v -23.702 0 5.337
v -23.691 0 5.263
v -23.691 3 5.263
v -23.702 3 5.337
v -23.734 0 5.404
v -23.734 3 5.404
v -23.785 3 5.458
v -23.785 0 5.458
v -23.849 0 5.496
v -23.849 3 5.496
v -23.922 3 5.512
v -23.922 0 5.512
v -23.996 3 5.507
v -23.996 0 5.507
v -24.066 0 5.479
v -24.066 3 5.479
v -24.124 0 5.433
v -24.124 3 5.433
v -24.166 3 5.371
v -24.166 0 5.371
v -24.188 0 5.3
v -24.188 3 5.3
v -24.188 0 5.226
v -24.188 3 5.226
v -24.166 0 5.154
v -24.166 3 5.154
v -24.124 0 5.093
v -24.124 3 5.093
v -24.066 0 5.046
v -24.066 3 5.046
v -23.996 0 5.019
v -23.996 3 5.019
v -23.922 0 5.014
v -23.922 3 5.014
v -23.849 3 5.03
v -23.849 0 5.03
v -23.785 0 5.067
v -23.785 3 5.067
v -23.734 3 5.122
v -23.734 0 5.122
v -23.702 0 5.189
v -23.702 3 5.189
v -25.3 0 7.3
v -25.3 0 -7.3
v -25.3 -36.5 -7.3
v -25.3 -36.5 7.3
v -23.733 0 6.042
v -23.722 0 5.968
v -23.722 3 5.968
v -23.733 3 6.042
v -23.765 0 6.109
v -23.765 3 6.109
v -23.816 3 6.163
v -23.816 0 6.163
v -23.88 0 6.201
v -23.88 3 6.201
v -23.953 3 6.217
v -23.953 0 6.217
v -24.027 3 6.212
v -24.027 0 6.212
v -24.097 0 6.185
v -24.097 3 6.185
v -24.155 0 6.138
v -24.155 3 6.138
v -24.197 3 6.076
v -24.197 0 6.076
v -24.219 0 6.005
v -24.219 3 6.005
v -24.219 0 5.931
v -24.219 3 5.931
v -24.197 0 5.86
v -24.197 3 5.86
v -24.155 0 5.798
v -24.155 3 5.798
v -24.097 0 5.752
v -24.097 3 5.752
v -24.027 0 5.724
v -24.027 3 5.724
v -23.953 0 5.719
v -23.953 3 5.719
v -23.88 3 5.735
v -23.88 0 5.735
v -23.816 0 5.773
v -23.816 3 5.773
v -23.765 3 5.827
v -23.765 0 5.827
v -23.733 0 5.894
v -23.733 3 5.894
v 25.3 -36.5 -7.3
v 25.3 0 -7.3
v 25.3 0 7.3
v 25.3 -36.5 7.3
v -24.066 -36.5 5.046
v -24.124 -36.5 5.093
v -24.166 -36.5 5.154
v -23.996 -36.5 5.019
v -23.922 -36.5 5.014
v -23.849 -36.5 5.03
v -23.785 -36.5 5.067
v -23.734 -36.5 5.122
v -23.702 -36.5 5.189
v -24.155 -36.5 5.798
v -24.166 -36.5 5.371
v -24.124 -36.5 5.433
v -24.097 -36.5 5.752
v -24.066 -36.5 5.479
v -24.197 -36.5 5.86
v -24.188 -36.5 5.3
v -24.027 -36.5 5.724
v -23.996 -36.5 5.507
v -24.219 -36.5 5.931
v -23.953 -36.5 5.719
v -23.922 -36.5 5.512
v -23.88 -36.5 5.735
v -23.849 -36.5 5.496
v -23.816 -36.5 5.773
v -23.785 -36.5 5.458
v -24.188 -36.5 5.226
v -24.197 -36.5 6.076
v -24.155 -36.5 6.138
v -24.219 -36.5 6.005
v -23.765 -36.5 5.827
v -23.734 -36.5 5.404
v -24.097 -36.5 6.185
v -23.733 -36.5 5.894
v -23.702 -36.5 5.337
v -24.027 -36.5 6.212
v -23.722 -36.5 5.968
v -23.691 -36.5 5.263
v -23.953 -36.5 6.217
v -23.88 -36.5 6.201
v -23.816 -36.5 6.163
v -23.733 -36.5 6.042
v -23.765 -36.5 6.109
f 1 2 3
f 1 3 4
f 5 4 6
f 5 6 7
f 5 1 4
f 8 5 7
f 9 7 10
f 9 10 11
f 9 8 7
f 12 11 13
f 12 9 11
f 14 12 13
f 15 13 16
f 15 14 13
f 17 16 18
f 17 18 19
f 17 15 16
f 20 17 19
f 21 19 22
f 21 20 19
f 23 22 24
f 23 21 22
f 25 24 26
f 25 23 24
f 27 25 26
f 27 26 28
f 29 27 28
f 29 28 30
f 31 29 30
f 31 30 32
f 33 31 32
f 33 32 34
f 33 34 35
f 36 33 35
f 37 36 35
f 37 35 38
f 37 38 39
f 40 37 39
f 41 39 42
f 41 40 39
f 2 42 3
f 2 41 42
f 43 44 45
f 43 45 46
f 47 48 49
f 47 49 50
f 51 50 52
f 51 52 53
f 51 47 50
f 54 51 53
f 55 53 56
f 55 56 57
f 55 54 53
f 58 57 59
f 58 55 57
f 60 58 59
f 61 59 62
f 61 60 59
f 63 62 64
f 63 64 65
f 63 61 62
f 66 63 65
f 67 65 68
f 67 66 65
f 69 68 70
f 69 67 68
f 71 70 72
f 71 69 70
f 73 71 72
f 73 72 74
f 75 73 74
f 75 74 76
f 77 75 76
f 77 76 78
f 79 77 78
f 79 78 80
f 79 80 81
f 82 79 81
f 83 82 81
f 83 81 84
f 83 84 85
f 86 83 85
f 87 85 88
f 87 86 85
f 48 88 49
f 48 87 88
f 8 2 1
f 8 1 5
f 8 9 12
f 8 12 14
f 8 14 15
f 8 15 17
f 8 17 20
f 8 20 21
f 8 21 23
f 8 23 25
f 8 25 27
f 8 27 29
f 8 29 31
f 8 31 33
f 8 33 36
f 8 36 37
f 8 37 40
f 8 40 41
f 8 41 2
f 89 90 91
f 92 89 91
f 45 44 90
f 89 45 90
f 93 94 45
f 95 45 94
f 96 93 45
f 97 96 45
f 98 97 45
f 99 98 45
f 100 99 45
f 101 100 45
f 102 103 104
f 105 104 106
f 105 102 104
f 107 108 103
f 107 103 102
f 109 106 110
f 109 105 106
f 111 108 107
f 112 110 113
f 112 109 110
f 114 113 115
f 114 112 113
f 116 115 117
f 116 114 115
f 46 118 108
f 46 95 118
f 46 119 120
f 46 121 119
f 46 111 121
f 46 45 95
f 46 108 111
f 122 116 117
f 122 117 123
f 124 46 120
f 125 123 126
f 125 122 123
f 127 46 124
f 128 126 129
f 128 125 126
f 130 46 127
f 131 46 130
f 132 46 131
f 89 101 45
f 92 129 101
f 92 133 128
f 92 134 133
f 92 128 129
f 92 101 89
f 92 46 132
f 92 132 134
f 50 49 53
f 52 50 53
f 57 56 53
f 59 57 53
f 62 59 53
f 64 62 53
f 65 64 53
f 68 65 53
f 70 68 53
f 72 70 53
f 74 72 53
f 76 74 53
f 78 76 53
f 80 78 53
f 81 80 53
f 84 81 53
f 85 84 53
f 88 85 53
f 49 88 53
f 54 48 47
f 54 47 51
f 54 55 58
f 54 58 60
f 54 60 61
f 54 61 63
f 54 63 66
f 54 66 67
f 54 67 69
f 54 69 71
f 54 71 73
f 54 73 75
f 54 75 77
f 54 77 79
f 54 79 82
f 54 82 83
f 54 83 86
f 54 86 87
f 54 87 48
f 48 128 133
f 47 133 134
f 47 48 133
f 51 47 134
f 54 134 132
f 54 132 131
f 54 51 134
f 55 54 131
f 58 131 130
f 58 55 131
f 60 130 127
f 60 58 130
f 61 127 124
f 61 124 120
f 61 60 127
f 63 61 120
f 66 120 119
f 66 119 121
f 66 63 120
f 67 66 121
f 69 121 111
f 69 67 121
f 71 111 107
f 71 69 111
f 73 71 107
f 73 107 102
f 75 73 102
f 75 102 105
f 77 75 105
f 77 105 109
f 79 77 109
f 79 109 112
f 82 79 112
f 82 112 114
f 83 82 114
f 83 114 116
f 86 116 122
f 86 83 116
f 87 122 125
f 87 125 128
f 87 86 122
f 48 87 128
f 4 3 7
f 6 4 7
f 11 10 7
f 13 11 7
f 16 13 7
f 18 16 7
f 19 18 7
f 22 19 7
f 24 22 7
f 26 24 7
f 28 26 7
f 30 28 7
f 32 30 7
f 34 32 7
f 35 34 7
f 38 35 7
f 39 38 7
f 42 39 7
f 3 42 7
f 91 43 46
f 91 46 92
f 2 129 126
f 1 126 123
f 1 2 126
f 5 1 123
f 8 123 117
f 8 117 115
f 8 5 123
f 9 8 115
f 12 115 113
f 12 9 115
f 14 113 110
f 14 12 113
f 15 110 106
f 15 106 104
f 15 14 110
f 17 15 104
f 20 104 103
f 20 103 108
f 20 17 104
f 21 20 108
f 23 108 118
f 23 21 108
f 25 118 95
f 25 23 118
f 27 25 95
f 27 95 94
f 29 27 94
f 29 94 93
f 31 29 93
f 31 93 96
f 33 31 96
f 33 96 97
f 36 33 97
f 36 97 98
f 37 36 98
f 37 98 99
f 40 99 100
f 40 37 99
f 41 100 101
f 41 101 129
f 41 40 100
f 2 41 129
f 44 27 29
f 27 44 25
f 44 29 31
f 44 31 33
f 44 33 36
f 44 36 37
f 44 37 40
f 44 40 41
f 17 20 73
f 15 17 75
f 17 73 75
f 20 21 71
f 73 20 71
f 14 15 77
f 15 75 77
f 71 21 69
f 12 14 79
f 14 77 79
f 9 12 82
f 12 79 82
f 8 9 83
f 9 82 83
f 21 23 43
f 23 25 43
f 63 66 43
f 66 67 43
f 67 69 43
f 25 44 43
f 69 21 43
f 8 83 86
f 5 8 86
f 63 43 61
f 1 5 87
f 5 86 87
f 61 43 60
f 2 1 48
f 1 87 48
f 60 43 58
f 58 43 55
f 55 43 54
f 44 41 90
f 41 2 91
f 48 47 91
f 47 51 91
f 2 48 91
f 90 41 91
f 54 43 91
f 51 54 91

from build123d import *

# Parameters (mm, degrees)
F0_W     = 50.6
F0_H     = 14.6
F0_R     = 0.25
F1_DEPTH = 36.5
F2_DEPTH = 3


with BuildPart() as f1:
    # F0 (on Front) → F1 (new body)
    with BuildSketch(Plane.XZ):
        Rectangle(F0_W, F0_H)
        with Locations((-23.940524, 5.262874)):
            Circle(F0_R, mode=Mode.SUBTRACT)
        with Locations((-23.971662, 5.968016)):
            Circle(F0_R, mode=Mode.SUBTRACT)
    extrude(amount=F1_DEPTH)


with BuildPart() as f2:
    # F0 (on Front) → F2 (new body)
    with BuildSketch(Plane.XZ):
        with Locations((-23.971662, 5.968016)):
            Circle(F0_R)
        with Locations((-23.940524, 5.262874)):
            Circle(F0_R)
    extrude(amount=-F2_DEPTH)


solid = Compound([f1.part, f2.part])
